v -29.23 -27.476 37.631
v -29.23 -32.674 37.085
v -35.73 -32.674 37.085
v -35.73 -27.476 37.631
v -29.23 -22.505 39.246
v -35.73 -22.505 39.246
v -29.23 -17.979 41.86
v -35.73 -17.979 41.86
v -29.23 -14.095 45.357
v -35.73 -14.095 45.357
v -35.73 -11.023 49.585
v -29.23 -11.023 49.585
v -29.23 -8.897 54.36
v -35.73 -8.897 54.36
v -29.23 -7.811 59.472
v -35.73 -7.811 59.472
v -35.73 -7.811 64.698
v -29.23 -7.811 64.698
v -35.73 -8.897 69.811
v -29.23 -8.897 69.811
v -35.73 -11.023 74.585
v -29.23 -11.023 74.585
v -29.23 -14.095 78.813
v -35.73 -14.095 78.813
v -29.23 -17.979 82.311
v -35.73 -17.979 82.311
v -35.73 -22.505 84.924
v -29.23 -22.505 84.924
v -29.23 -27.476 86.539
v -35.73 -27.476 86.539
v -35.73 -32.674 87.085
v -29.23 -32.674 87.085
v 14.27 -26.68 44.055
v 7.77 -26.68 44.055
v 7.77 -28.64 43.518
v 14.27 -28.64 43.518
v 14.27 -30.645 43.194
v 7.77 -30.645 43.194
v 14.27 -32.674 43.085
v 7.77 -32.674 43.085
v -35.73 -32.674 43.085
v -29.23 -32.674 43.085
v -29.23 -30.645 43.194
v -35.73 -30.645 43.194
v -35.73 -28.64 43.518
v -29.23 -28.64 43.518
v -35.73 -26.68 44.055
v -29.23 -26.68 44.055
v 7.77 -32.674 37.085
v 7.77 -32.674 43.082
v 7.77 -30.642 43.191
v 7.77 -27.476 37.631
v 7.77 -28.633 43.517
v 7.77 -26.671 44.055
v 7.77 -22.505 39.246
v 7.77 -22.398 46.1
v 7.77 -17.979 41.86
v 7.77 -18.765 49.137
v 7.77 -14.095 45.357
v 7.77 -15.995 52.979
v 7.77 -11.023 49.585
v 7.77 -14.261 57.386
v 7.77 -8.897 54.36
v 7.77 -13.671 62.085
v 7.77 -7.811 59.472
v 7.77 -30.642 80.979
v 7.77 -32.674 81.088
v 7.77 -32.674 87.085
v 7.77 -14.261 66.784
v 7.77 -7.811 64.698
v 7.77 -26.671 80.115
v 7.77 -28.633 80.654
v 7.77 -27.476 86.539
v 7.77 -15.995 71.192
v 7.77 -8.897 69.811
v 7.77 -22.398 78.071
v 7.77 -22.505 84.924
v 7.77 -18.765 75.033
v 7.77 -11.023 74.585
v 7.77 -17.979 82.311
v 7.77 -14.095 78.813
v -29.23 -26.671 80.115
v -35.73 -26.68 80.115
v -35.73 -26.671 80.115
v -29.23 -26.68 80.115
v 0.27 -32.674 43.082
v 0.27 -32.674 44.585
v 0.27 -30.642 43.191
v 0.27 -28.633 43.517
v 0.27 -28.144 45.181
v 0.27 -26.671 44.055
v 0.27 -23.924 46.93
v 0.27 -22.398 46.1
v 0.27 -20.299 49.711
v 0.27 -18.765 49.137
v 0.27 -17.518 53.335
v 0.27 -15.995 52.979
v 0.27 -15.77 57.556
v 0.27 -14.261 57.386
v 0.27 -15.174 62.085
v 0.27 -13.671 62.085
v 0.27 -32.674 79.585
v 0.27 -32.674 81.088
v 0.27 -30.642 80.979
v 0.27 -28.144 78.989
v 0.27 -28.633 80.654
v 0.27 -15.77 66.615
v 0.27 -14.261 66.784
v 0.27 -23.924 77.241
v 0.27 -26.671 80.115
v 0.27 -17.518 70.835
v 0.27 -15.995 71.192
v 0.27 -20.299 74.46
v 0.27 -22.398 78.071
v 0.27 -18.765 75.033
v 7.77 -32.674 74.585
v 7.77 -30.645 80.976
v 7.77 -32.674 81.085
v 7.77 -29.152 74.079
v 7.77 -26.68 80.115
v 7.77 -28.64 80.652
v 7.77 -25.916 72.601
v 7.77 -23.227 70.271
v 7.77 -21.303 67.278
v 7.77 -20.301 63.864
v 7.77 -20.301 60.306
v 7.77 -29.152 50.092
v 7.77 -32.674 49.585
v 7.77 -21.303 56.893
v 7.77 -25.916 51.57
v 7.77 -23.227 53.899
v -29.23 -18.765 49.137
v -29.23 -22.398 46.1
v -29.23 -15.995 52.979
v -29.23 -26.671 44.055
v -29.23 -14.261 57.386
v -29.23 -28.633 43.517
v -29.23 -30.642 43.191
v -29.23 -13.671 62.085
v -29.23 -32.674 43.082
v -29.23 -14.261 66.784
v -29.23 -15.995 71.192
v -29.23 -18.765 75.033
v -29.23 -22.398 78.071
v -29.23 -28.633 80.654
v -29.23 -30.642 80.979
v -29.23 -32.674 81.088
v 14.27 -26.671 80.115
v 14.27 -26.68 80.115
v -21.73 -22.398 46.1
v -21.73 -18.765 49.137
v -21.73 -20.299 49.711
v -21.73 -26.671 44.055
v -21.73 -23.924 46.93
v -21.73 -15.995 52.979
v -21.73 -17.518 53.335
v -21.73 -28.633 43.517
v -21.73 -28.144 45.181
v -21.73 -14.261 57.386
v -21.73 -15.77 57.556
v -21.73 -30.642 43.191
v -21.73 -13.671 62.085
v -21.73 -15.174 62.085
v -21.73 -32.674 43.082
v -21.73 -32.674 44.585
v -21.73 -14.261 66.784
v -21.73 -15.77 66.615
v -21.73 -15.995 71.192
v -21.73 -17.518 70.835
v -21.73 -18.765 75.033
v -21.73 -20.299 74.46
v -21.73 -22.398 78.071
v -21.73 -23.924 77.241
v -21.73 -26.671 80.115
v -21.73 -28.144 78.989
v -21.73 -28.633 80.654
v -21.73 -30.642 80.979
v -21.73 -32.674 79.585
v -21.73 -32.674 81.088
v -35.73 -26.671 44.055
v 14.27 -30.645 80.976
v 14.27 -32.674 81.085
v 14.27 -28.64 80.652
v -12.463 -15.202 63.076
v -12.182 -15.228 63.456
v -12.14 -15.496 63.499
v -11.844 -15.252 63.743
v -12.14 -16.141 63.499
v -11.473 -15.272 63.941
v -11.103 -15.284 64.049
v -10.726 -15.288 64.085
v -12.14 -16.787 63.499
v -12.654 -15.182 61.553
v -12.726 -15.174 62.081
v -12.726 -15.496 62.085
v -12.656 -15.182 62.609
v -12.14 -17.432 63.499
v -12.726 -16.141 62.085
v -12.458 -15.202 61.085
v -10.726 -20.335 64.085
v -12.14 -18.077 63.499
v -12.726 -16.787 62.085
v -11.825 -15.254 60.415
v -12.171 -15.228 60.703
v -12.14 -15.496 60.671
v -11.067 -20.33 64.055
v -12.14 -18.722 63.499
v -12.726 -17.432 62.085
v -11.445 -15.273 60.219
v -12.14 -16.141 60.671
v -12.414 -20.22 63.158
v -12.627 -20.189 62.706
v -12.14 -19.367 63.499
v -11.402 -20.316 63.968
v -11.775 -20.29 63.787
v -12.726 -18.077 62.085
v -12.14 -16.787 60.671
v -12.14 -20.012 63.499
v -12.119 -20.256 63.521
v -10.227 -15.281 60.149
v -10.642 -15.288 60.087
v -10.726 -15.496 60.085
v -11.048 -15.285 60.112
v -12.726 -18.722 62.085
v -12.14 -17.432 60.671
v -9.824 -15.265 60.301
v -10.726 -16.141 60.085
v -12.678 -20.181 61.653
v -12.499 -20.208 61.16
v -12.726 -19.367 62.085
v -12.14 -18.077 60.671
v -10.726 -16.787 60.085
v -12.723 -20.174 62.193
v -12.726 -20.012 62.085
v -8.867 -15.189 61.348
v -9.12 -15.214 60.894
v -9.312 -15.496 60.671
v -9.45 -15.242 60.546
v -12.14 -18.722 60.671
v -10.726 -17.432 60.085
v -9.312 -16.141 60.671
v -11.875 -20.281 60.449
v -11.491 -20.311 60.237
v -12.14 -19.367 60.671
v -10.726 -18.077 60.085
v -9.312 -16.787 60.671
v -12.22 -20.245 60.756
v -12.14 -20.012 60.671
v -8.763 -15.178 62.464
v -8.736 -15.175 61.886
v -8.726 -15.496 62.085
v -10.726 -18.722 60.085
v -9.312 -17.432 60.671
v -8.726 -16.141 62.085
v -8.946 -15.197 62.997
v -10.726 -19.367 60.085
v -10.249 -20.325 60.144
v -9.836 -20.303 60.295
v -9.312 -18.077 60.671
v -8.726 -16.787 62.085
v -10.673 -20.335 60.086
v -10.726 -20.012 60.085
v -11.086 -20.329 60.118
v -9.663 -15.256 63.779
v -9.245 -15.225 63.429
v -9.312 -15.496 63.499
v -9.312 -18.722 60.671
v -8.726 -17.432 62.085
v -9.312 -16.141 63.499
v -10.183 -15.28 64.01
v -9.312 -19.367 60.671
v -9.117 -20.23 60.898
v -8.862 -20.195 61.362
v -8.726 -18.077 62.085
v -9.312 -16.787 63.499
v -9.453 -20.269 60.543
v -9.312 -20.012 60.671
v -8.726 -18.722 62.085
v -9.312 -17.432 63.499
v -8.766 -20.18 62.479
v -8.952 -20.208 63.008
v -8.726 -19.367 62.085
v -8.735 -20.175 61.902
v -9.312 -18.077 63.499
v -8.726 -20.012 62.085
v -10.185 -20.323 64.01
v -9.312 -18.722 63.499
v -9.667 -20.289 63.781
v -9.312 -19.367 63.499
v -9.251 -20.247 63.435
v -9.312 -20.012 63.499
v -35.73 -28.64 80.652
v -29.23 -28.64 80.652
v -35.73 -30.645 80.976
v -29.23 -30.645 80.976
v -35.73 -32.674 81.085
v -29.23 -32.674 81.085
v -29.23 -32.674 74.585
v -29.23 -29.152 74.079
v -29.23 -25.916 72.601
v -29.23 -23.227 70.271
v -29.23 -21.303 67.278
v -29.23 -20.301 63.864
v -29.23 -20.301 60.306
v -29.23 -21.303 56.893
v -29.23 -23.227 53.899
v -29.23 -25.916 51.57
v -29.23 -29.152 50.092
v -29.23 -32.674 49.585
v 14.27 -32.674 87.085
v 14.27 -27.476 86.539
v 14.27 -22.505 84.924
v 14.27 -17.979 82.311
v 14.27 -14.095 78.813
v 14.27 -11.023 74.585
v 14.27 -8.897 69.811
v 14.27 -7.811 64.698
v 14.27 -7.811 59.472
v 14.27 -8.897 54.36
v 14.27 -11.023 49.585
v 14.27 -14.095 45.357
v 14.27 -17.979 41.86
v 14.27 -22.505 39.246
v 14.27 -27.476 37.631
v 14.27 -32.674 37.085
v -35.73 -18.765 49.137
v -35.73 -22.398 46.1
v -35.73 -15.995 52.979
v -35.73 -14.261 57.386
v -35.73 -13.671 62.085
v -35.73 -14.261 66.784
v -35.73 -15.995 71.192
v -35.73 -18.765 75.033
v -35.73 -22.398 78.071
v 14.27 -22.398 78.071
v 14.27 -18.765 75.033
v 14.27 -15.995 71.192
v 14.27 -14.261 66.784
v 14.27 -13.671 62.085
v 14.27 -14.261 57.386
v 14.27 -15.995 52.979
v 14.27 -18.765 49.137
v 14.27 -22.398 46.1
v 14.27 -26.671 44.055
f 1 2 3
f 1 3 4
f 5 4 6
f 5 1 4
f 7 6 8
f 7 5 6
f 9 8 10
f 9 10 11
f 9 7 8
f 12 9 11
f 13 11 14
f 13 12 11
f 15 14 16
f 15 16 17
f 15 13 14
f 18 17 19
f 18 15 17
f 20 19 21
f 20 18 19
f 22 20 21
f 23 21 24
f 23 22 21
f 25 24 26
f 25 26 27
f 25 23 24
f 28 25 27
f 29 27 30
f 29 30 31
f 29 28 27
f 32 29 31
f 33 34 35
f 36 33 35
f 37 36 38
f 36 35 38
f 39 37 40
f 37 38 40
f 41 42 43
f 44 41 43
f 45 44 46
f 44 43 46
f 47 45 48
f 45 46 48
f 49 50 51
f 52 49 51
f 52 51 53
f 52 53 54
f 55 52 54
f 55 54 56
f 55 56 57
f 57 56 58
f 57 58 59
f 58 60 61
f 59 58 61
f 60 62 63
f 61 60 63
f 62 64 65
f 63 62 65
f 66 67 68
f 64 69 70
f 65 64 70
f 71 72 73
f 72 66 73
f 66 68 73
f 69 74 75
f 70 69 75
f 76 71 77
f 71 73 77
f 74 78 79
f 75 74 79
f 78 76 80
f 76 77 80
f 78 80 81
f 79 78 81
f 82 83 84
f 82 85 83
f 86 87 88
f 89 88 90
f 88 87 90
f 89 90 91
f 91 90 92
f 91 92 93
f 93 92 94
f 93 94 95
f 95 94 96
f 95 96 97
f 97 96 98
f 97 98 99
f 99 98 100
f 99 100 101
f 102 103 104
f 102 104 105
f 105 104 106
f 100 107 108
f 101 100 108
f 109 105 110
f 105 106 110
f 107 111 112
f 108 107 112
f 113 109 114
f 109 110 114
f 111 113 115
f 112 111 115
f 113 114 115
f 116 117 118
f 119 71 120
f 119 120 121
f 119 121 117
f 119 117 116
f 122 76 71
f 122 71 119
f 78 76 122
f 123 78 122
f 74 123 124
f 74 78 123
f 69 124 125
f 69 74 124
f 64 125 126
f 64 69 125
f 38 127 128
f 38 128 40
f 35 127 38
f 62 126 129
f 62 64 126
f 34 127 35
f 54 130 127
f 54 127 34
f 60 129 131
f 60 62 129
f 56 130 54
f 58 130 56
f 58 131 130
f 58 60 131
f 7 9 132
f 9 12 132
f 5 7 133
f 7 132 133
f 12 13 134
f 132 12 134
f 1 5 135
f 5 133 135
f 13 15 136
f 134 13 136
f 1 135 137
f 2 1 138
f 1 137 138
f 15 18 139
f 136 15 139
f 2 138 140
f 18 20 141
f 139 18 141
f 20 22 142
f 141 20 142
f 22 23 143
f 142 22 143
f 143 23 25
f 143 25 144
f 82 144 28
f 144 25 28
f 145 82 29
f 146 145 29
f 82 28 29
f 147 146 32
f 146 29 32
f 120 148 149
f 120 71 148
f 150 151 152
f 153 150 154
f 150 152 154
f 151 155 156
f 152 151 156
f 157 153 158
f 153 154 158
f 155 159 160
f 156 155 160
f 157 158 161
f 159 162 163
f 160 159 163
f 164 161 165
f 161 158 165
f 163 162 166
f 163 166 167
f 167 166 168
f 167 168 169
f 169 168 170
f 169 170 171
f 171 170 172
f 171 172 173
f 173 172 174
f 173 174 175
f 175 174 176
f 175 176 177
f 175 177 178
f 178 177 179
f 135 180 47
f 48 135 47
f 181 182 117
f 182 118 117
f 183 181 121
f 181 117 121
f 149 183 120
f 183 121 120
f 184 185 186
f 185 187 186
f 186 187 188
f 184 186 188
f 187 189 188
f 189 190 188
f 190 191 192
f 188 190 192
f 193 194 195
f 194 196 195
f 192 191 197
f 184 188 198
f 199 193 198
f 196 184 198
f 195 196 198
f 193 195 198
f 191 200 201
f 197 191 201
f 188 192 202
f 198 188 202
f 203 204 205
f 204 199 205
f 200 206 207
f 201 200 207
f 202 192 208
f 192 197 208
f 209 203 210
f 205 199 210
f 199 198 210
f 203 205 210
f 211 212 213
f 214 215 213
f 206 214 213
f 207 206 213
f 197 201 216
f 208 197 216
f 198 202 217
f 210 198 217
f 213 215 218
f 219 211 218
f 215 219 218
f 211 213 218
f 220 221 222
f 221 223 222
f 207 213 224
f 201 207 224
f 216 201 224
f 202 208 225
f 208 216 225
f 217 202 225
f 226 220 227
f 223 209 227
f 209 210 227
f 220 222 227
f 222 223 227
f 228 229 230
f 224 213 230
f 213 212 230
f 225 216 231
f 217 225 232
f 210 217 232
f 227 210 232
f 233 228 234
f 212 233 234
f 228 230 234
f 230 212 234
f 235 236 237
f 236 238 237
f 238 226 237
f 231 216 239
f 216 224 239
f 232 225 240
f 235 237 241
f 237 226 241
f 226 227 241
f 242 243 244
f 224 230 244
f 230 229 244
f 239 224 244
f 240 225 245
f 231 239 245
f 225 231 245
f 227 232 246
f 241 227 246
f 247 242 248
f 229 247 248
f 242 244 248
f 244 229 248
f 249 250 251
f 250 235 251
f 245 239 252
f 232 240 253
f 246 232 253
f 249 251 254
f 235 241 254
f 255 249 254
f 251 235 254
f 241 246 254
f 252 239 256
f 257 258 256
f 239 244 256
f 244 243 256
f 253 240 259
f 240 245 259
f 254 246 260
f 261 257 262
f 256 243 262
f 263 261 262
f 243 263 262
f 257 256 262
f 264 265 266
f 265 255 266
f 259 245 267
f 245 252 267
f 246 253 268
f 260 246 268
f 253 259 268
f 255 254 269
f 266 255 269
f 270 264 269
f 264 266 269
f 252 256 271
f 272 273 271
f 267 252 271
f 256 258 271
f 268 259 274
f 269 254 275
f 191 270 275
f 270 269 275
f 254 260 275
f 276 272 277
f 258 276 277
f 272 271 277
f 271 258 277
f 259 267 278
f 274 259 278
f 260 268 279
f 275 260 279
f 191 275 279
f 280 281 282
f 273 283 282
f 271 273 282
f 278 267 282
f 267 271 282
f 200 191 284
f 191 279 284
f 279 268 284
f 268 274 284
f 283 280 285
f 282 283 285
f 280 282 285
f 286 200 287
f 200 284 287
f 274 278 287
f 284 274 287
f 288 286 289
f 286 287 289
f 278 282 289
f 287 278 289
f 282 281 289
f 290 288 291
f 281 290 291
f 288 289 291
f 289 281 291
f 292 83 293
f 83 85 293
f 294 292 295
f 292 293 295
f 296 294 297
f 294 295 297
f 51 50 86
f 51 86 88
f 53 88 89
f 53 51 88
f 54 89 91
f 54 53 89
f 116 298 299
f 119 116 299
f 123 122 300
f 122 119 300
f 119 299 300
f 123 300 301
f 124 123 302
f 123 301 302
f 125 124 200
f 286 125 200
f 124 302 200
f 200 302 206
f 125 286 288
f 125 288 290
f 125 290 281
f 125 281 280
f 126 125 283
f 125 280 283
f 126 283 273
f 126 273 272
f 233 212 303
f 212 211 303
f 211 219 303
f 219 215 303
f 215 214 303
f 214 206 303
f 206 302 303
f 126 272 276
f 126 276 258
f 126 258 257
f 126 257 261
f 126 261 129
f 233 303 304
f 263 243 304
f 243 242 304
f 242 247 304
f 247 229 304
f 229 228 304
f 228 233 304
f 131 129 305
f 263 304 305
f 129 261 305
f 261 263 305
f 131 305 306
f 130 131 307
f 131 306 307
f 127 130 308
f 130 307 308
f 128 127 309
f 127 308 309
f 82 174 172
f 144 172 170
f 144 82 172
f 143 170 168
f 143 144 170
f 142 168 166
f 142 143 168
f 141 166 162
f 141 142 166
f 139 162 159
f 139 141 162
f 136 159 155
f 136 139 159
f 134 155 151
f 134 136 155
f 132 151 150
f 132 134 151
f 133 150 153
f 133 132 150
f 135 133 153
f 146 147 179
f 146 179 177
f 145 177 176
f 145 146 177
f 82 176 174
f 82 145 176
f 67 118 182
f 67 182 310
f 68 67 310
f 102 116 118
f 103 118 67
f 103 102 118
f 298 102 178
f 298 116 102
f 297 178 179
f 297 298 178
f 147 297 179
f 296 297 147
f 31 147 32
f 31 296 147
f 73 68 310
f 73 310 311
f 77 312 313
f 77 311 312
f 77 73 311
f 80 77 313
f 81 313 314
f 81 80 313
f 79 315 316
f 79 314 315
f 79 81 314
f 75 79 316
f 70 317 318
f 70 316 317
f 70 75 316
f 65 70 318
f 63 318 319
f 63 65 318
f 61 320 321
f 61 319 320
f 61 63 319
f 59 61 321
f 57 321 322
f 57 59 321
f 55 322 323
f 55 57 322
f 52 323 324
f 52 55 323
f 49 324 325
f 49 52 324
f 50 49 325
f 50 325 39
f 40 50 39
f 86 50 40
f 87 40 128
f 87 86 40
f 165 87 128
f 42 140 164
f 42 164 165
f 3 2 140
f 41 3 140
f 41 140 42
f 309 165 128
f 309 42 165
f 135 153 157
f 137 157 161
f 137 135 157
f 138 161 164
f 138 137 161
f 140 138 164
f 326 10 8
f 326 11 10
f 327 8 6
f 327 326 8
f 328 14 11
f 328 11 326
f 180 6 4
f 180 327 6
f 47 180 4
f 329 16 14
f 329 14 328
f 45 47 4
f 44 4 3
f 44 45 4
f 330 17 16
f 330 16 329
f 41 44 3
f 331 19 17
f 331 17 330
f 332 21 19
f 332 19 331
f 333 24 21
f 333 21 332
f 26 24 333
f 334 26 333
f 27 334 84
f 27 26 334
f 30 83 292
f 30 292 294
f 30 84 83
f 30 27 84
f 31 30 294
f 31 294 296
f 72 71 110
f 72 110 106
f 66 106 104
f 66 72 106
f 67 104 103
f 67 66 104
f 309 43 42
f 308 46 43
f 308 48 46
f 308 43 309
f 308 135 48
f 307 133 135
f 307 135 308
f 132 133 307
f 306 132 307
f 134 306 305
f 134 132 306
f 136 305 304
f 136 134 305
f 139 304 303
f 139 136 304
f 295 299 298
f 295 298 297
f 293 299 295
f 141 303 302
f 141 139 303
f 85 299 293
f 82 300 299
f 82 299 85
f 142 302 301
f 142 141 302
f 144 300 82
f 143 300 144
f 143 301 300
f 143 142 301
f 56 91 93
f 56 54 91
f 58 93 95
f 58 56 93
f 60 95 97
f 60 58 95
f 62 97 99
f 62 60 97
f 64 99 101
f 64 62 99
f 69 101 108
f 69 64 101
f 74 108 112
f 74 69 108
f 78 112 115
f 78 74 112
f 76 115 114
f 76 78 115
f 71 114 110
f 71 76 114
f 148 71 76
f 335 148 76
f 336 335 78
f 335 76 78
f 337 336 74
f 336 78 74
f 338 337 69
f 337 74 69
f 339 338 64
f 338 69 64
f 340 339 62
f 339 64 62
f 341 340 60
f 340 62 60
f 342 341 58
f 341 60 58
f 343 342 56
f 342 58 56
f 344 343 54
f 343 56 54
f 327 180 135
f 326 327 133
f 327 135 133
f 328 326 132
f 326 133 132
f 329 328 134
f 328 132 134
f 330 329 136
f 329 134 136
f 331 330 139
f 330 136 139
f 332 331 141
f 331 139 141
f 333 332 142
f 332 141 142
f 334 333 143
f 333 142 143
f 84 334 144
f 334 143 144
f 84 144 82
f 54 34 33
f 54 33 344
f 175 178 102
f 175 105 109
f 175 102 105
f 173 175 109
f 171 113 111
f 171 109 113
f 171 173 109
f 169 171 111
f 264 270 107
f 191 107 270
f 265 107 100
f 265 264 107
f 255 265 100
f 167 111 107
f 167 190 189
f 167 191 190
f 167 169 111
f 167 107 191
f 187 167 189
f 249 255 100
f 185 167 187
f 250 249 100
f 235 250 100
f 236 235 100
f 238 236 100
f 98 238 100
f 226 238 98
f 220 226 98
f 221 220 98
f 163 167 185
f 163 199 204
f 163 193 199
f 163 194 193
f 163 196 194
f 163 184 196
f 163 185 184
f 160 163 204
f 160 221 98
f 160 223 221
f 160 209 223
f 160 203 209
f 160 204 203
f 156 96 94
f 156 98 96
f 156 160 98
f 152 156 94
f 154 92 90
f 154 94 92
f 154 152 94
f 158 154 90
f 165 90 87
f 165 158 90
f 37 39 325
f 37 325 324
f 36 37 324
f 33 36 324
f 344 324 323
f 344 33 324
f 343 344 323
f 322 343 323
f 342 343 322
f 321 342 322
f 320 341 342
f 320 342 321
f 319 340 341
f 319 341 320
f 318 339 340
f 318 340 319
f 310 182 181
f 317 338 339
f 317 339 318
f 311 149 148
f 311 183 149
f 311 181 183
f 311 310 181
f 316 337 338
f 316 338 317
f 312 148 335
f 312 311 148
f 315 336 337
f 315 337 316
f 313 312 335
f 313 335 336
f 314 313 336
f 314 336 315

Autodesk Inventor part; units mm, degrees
ref_plane "YZ Plane" through (0, 0, 0) normal (1, 0, 0) x (0, 1, 0)
ref_plane "XZ Plane" through (0, 0, 0) normal (0, 1, 0) x (-1, 0, 0)
ref_plane "XY Plane" through (0, 0, 0) normal (0, 0, 1) x (1, 0, 0)
ref_plane "Work Plane1" through (7.7698, -13.6706, 100.9039) normal (1, 0, 0) x (0, 1, 0)
sketch "Sketch1" plane through (7.7698, -13.6706, 100.9039) normal (1, 0, 0) x (0, 1, 0)
  arc A0 (-13, -56.8488) -> (-13, -20.7888) centre (-19.0031, -38.8188) ccw projected
  line L0 (-26, -56.8488) -> (-13, -56.8488) projected
  line L1 (-13, -20.7888) -> (-26, -20.7888) projected
  arc A1 (-19.0031, -51.3188) -> (-19.0031, -26.3188) centre (-19.0031, -38.8188) ccw
  arc A2 (-19.0031, -56.3188) -> (-19.0031, -21.3188) centre (-19.0031, -38.8188) ccw
  arc A3 (-19.0031, -63.8188) -> (-19.0031, -13.8188) centre (-19.0031, -38.8188) ccw
  line L2 (-19.0031, -13.8188) -> (-19.0031, -63.8188)
  arc A4 (-13, -56.8488) -> (-13, -20.7888) centre (-19.0031, -38.8188) ccw projected
  arc A5 (-19.0031, -57.8188) -> (-19.0031, -19.8188) centre (-19.0031, -38.8188) ccw
  point P0 (13.6706, -100.9039)
  point P1 (-13.0099, -20.7888)
  point P2 (-13.0099, -56.8488)
  dimension "d0" = 12.5
  dimension "d1" = 17.5
  dimension "d2" = 25
  dimension "d3" = 19
extrude "Extrusion1" add sketch "Sketch1" along normal blind 6.5 contours A0 L1 A5 L2 A3 L0
ref_plane "Work Plane2" through (7.7698, -40.6706, 62.0852) normal (1, 0, 0) x (0, 1, 0)
sketch "Sketch2" plane through (7.7698, -40.6706, 62.0852) normal (1, 0, 0) x (0, 1, 0)
  arc A0 (14, -18.03) -> (14, 18.03) centre (7.9969, 0) ccw projected
  arc A1 (7.9969, -19.0031) -> (7.9969, 19.0031) centre (7.9969, 0) ccw
  arc A2 (7.9969, -17.5) -> (7.9969, 17.5) centre (7.9969, 0) ccw
  line L0 (7.9969, 19.0031) -> (7.9969, -19.0031)
  point P0 (40.6706, -62.0852)
  point P1 (14, 18.03)
  dimension "d6" = 17.5
extrude "Extrusion2" add sketch "Sketch2" against normal blind 7.5 contours A1 L0 A2 A0
sketch "Sketch3" plane through (7.7698, -40.6706, 62.0852) normal (1, 0, 0) x (0, 0, -1)
  arc A0 (17.5, 7.9969) -> (-17.5, 7.9969) centre (0, 7.9969) ccw projected
  arc A1 (18.03, 14) -> (-18.03, 14) centre (0, 7.9969) ccw projected
  arc A2 (12.5, 7.9969) -> (-12.5, 7.9969) centre (0, 7.9969) ccw
  line L0 (-17.5, 7.9969) -> (17.5, 7.9969)
  point P0 (62.0852, 40.6706)
  dimension "d9" = 12.5
extrude "Extrusion3" add sketch "Sketch3" against normal blind 18.5 contours L0 A2 A0
ref_plane "Work Plane3" through (-10.7302, -40.6706, 62.0852) normal (-1, 0, 0) x (0, 0, 1)
mirror "Mirror1" about plane through (-10.7302, -40.6706, 62.0852) normal (-1, 0, 0) of "Extrusion1", "Extrusion2", "Extrusion3"
ref_plane "Work Plane4" through (-10.7262, -56.0476, 62.0852) normal (0, 1, 0) x (-1, 0, 0)
sketch "Sketch4" plane through (-10.7262, -56.0476, 62.0852) normal (0, 1, 0) x (-1, 0, 0)
  spline S0 degree 3 poles (0, 2) (0.2512, 2) (0.5191, 1.9498) (1.0118, 1.7457) (1.2367, 1.5918) (1.5918, 1.2367) (1.7457, 1.0118) (1.9498, 0.5191) (2, 0.2512) (2, -0.2512) (1.9498, -0.5191) (1.7457, -1.0118) (1.5918, -1.2367) (1.2367, -1.5918) (1.0118, -1.7457) (0.5191, -1.9498) (0.2512, -2) (-0.2512, -2) (-0.5191, -1.9498) (-1.0118, -1.7457) (-1.2367, -1.5918) (-1.5918, -1.2367) (-1.7457, -1.0118) (-1.9498, -0.5191) (-2, -0.2512) (-2, 0.2512) (-1.9498, 0.5191) (-1.7457, 1.0118) (-1.5918, 1.2367) (-1.2367, 1.5918) (-1.0118, 1.7457) (-0.5191, 1.9498) (-0.2512, 2) (0, 2) knots 0 0 0 0 0.075352 0.075352 0.150705 0.150705 0.226057 0.226057 0.301409 0.301409 0.376761 0.376761 0.452114 0.452114 0.527466 0.527466 0.602818 0.602818 0.67817 0.67817 0.753523 0.753523 0.828875 0.828875 0.904227 0.904227 0.979579 0.979579 1.054932 1.054932 1.130284 1.130284 1.205636 1.205636 1.205636 1.205636 projected
  point P0 (-10.7262, -62.0852)
  point P1 (0, 2)
extrude "Extrusion4" cut sketch "Sketch4" along normal through all
properties part number "BEARING TOP" material "Iron, Gray"
